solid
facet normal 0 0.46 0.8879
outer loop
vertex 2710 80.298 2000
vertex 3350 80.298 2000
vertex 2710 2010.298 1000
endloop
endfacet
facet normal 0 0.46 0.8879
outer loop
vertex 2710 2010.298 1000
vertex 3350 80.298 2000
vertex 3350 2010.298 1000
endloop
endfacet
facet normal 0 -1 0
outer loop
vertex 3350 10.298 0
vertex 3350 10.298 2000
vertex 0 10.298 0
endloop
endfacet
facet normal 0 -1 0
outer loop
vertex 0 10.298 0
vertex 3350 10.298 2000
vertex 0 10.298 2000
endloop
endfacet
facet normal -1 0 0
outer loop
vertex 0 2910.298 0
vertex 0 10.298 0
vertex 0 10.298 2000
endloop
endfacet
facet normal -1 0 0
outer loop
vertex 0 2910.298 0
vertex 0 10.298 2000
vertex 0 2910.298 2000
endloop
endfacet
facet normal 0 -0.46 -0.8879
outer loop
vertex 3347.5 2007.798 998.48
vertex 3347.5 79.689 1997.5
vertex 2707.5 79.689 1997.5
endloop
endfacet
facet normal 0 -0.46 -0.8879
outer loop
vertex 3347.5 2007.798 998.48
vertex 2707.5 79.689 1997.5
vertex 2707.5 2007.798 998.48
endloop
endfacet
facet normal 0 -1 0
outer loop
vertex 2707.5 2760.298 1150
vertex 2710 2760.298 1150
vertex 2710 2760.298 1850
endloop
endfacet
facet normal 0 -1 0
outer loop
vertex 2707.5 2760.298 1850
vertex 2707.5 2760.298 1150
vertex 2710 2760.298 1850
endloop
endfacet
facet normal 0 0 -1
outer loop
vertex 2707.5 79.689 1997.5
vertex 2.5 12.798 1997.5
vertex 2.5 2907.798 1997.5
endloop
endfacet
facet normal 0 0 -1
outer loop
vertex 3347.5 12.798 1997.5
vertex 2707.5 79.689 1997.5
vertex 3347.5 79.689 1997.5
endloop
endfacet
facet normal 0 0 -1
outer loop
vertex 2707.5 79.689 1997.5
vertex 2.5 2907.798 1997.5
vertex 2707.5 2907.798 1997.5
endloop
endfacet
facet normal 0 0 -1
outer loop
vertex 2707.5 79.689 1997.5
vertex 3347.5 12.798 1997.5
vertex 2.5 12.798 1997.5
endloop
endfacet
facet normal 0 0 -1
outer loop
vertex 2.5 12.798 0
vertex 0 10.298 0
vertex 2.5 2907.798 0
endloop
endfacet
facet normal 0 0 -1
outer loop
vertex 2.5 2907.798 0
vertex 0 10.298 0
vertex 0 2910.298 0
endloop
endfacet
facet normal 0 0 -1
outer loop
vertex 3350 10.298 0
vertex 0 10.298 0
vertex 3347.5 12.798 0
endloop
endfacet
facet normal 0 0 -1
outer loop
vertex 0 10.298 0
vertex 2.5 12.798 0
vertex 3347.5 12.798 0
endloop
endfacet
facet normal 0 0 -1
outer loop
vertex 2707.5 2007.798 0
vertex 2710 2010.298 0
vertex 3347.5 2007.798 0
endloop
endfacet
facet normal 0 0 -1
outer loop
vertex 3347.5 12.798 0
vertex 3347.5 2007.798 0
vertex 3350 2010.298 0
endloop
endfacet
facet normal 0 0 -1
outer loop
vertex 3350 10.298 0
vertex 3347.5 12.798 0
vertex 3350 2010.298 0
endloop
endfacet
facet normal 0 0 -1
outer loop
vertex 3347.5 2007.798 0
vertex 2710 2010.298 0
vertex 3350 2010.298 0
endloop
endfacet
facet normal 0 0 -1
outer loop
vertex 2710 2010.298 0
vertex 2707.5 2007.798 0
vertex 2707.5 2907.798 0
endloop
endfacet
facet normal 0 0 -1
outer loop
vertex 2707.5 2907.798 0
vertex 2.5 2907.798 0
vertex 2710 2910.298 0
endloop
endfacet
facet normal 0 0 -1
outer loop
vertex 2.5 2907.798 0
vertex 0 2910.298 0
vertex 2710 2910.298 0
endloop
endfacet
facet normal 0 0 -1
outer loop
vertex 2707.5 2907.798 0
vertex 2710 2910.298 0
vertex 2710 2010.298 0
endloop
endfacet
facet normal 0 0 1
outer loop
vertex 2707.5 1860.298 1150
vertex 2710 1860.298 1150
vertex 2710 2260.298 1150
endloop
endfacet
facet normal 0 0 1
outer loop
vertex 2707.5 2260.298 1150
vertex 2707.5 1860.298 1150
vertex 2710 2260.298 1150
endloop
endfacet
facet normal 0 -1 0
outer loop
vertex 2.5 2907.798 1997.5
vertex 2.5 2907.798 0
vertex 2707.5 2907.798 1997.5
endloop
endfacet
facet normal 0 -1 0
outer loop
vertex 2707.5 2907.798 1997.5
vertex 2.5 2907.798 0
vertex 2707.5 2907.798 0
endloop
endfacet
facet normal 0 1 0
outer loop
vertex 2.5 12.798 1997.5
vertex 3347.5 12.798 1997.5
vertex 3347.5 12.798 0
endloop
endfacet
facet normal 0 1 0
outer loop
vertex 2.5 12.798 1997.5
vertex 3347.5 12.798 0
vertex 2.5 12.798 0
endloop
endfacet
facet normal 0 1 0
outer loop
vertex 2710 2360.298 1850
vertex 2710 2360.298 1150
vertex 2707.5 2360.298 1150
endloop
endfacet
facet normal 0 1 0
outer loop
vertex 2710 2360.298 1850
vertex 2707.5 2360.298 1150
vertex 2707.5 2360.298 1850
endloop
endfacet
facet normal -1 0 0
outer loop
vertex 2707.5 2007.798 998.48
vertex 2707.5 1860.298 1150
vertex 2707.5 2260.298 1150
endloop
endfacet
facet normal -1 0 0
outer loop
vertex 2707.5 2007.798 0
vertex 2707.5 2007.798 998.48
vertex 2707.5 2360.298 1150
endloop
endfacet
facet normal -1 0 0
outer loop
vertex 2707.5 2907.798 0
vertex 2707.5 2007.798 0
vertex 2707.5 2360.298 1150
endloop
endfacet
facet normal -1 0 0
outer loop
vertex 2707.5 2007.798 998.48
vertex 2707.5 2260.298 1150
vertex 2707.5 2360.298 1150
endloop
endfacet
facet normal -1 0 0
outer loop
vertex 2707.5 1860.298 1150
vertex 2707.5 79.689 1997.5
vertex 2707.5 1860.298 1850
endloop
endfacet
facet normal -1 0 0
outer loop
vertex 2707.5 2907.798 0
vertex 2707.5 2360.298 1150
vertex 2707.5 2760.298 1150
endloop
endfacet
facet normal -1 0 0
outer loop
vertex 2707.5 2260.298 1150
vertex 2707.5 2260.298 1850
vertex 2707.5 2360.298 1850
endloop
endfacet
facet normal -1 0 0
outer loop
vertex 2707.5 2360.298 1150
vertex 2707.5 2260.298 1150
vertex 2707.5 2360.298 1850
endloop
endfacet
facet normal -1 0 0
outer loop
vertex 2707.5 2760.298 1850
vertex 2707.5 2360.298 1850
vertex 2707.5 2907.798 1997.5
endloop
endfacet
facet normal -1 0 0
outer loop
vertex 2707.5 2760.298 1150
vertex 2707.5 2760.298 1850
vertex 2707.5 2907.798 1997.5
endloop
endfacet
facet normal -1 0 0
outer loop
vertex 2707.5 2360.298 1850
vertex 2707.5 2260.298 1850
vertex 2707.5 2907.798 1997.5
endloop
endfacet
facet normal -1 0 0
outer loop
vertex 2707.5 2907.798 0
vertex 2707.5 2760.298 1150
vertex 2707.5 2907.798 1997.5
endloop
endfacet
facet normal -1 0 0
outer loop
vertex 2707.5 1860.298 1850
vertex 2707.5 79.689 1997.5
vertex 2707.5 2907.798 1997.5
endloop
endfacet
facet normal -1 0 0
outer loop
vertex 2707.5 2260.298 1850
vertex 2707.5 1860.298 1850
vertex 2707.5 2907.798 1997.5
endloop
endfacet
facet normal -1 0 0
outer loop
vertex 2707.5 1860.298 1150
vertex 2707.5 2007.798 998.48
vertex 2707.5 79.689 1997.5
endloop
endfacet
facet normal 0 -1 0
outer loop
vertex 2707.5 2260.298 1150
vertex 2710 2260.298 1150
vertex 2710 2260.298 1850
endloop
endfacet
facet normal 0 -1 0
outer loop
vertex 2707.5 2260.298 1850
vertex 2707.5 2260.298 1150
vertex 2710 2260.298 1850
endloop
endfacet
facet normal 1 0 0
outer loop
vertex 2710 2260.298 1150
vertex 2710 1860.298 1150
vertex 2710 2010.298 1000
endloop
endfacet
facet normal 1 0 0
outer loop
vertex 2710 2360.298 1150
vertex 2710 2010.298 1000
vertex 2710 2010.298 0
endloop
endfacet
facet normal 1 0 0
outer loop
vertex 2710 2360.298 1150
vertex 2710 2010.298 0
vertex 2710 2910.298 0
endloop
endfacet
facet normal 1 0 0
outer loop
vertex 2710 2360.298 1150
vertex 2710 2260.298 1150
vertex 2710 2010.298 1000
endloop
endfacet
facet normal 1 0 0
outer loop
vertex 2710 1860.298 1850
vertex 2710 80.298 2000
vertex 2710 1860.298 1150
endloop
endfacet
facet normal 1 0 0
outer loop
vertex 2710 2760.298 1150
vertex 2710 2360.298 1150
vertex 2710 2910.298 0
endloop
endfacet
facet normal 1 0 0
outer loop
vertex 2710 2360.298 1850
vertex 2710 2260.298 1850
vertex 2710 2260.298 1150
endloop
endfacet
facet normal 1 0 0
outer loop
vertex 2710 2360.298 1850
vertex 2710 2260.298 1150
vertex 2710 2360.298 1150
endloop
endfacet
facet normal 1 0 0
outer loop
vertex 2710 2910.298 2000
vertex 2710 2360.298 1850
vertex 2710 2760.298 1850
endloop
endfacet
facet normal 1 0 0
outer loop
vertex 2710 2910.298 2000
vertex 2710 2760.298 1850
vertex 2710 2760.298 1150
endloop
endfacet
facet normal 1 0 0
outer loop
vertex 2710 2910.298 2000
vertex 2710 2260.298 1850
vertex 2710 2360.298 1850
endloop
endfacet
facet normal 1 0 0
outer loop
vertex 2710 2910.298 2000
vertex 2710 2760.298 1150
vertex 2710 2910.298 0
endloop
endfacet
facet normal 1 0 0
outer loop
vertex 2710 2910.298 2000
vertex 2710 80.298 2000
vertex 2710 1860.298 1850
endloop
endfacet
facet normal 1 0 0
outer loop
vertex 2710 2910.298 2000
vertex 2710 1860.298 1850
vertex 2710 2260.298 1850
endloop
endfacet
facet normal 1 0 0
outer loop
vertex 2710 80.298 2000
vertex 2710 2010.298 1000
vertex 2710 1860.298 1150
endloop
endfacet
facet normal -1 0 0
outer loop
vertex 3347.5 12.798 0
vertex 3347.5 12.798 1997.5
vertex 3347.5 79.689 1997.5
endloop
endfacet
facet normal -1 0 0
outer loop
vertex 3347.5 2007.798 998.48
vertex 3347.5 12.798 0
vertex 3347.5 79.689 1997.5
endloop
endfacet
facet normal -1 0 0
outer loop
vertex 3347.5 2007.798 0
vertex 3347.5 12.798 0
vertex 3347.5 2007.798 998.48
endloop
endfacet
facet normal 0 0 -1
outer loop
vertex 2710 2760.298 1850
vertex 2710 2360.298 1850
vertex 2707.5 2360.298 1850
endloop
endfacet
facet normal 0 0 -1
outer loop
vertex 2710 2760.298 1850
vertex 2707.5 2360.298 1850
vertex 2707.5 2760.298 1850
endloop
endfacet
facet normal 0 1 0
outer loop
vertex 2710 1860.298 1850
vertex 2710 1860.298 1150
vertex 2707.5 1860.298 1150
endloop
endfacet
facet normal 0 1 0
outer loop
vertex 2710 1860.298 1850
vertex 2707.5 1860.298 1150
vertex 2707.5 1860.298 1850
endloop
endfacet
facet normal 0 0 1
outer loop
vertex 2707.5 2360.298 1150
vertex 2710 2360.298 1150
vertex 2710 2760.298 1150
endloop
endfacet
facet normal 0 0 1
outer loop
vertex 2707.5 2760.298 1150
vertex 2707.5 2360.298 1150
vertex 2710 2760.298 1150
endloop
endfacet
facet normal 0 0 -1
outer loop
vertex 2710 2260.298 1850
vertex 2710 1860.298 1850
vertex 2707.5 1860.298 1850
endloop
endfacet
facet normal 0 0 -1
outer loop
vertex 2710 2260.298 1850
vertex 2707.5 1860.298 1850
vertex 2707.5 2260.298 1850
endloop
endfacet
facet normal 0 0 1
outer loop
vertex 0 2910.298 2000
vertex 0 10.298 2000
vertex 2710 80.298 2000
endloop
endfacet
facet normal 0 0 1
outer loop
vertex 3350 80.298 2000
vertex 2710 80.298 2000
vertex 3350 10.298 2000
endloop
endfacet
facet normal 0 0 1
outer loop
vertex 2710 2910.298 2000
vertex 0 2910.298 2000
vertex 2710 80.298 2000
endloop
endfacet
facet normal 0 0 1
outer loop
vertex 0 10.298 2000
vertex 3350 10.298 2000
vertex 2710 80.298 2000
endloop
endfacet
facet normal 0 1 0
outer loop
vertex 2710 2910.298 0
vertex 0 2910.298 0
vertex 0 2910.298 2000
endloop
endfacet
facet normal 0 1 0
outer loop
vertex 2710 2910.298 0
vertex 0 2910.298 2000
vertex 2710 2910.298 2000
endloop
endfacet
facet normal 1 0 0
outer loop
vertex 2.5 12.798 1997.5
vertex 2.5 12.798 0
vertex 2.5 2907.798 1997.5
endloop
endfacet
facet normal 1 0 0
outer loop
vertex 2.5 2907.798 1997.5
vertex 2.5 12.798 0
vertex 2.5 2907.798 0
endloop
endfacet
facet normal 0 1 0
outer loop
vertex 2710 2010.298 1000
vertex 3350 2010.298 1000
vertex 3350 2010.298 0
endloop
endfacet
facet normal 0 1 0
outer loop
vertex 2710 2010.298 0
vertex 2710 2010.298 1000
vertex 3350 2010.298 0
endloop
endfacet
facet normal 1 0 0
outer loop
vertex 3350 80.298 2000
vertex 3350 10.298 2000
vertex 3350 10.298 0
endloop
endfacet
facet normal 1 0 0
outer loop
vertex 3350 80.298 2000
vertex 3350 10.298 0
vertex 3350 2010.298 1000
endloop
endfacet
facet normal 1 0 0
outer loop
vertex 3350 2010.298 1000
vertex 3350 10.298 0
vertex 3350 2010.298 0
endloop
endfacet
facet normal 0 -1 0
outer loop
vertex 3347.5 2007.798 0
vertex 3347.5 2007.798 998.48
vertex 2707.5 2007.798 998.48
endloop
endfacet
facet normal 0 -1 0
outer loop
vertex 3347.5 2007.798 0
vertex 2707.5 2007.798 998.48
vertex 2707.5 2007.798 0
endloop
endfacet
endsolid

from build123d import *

# Parameters (mm, degrees)
F0_W      = 3350
F0_H      = 2900
F1_DEPTH  = 2000
F5_DEPTH  = 640
F9_DEPTH  = 2900
F10_T     = -2.5
F11_W     = 400
F11_H     = 700
F12_DEPTH = 2.5


# Not quite as in the source:
# - an extrude ends at something that could not be found from the text; its depth is read off the source's solid
# - a feature of the source that left no trace in its solid (it failed there, or was rolled back) is left out


with BuildPart() as f1:
    # F0 (on Top) → F1 (new body)
    with BuildSketch(Plane.XY):
        with Locations((1675, 1460.2979007226)):
            Rectangle(F0_W, F0_H)
    extrude(amount=F1_DEPTH)

    # F4 (on face) → F5 (cut, through all)
    with BuildSketch(Plane.YZ.offset(3350)):
        Polygon((2910.2979007226, 2000), (80.2979007226, 2000), (2010.2979007226, 1000), (2010.2979007226, 0), (2910.2979007226, 0), (2910.2979007226, 1000), align=None)
    extrude(amount=-F5_DEPTH, mode=Mode.SUBTRACT)

    # F8 (on face) → F9 (join, through all)
    with BuildSketch(Plane(origin=(0, 2910.2979007226, 0), x_dir=(-1, 0, 0), z_dir=(0, 1, 0))):
        Polygon((-2310, 1000), (-1030, 2000), (-2710, 2000), (-2710, 0), (-2310, 0), align=None)
    extrude(amount=-F9_DEPTH)

    # F10
    f10_openings = [f1.faces().sort_by_distance(p)[0] for p in [
        (1589.598971, 1397.271311, 0),
    ]]
    offset(amount=F10_T, openings=f10_openings, kind=Kind.INTERSECTION)

    # F11 (on face) → F12 (cut, through all)
    with BuildSketch(Plane.YZ.offset(2710)):
        with Locations((2560.2979007226, 1500)):
            Rectangle(F11_W, F11_H)
        with Locations((2060.2979007226, 1500)):
            Rectangle(F11_W, F11_H)
    extrude(amount=-F12_DEPTH, mode=Mode.SUBTRACT)


solid = f1.part
